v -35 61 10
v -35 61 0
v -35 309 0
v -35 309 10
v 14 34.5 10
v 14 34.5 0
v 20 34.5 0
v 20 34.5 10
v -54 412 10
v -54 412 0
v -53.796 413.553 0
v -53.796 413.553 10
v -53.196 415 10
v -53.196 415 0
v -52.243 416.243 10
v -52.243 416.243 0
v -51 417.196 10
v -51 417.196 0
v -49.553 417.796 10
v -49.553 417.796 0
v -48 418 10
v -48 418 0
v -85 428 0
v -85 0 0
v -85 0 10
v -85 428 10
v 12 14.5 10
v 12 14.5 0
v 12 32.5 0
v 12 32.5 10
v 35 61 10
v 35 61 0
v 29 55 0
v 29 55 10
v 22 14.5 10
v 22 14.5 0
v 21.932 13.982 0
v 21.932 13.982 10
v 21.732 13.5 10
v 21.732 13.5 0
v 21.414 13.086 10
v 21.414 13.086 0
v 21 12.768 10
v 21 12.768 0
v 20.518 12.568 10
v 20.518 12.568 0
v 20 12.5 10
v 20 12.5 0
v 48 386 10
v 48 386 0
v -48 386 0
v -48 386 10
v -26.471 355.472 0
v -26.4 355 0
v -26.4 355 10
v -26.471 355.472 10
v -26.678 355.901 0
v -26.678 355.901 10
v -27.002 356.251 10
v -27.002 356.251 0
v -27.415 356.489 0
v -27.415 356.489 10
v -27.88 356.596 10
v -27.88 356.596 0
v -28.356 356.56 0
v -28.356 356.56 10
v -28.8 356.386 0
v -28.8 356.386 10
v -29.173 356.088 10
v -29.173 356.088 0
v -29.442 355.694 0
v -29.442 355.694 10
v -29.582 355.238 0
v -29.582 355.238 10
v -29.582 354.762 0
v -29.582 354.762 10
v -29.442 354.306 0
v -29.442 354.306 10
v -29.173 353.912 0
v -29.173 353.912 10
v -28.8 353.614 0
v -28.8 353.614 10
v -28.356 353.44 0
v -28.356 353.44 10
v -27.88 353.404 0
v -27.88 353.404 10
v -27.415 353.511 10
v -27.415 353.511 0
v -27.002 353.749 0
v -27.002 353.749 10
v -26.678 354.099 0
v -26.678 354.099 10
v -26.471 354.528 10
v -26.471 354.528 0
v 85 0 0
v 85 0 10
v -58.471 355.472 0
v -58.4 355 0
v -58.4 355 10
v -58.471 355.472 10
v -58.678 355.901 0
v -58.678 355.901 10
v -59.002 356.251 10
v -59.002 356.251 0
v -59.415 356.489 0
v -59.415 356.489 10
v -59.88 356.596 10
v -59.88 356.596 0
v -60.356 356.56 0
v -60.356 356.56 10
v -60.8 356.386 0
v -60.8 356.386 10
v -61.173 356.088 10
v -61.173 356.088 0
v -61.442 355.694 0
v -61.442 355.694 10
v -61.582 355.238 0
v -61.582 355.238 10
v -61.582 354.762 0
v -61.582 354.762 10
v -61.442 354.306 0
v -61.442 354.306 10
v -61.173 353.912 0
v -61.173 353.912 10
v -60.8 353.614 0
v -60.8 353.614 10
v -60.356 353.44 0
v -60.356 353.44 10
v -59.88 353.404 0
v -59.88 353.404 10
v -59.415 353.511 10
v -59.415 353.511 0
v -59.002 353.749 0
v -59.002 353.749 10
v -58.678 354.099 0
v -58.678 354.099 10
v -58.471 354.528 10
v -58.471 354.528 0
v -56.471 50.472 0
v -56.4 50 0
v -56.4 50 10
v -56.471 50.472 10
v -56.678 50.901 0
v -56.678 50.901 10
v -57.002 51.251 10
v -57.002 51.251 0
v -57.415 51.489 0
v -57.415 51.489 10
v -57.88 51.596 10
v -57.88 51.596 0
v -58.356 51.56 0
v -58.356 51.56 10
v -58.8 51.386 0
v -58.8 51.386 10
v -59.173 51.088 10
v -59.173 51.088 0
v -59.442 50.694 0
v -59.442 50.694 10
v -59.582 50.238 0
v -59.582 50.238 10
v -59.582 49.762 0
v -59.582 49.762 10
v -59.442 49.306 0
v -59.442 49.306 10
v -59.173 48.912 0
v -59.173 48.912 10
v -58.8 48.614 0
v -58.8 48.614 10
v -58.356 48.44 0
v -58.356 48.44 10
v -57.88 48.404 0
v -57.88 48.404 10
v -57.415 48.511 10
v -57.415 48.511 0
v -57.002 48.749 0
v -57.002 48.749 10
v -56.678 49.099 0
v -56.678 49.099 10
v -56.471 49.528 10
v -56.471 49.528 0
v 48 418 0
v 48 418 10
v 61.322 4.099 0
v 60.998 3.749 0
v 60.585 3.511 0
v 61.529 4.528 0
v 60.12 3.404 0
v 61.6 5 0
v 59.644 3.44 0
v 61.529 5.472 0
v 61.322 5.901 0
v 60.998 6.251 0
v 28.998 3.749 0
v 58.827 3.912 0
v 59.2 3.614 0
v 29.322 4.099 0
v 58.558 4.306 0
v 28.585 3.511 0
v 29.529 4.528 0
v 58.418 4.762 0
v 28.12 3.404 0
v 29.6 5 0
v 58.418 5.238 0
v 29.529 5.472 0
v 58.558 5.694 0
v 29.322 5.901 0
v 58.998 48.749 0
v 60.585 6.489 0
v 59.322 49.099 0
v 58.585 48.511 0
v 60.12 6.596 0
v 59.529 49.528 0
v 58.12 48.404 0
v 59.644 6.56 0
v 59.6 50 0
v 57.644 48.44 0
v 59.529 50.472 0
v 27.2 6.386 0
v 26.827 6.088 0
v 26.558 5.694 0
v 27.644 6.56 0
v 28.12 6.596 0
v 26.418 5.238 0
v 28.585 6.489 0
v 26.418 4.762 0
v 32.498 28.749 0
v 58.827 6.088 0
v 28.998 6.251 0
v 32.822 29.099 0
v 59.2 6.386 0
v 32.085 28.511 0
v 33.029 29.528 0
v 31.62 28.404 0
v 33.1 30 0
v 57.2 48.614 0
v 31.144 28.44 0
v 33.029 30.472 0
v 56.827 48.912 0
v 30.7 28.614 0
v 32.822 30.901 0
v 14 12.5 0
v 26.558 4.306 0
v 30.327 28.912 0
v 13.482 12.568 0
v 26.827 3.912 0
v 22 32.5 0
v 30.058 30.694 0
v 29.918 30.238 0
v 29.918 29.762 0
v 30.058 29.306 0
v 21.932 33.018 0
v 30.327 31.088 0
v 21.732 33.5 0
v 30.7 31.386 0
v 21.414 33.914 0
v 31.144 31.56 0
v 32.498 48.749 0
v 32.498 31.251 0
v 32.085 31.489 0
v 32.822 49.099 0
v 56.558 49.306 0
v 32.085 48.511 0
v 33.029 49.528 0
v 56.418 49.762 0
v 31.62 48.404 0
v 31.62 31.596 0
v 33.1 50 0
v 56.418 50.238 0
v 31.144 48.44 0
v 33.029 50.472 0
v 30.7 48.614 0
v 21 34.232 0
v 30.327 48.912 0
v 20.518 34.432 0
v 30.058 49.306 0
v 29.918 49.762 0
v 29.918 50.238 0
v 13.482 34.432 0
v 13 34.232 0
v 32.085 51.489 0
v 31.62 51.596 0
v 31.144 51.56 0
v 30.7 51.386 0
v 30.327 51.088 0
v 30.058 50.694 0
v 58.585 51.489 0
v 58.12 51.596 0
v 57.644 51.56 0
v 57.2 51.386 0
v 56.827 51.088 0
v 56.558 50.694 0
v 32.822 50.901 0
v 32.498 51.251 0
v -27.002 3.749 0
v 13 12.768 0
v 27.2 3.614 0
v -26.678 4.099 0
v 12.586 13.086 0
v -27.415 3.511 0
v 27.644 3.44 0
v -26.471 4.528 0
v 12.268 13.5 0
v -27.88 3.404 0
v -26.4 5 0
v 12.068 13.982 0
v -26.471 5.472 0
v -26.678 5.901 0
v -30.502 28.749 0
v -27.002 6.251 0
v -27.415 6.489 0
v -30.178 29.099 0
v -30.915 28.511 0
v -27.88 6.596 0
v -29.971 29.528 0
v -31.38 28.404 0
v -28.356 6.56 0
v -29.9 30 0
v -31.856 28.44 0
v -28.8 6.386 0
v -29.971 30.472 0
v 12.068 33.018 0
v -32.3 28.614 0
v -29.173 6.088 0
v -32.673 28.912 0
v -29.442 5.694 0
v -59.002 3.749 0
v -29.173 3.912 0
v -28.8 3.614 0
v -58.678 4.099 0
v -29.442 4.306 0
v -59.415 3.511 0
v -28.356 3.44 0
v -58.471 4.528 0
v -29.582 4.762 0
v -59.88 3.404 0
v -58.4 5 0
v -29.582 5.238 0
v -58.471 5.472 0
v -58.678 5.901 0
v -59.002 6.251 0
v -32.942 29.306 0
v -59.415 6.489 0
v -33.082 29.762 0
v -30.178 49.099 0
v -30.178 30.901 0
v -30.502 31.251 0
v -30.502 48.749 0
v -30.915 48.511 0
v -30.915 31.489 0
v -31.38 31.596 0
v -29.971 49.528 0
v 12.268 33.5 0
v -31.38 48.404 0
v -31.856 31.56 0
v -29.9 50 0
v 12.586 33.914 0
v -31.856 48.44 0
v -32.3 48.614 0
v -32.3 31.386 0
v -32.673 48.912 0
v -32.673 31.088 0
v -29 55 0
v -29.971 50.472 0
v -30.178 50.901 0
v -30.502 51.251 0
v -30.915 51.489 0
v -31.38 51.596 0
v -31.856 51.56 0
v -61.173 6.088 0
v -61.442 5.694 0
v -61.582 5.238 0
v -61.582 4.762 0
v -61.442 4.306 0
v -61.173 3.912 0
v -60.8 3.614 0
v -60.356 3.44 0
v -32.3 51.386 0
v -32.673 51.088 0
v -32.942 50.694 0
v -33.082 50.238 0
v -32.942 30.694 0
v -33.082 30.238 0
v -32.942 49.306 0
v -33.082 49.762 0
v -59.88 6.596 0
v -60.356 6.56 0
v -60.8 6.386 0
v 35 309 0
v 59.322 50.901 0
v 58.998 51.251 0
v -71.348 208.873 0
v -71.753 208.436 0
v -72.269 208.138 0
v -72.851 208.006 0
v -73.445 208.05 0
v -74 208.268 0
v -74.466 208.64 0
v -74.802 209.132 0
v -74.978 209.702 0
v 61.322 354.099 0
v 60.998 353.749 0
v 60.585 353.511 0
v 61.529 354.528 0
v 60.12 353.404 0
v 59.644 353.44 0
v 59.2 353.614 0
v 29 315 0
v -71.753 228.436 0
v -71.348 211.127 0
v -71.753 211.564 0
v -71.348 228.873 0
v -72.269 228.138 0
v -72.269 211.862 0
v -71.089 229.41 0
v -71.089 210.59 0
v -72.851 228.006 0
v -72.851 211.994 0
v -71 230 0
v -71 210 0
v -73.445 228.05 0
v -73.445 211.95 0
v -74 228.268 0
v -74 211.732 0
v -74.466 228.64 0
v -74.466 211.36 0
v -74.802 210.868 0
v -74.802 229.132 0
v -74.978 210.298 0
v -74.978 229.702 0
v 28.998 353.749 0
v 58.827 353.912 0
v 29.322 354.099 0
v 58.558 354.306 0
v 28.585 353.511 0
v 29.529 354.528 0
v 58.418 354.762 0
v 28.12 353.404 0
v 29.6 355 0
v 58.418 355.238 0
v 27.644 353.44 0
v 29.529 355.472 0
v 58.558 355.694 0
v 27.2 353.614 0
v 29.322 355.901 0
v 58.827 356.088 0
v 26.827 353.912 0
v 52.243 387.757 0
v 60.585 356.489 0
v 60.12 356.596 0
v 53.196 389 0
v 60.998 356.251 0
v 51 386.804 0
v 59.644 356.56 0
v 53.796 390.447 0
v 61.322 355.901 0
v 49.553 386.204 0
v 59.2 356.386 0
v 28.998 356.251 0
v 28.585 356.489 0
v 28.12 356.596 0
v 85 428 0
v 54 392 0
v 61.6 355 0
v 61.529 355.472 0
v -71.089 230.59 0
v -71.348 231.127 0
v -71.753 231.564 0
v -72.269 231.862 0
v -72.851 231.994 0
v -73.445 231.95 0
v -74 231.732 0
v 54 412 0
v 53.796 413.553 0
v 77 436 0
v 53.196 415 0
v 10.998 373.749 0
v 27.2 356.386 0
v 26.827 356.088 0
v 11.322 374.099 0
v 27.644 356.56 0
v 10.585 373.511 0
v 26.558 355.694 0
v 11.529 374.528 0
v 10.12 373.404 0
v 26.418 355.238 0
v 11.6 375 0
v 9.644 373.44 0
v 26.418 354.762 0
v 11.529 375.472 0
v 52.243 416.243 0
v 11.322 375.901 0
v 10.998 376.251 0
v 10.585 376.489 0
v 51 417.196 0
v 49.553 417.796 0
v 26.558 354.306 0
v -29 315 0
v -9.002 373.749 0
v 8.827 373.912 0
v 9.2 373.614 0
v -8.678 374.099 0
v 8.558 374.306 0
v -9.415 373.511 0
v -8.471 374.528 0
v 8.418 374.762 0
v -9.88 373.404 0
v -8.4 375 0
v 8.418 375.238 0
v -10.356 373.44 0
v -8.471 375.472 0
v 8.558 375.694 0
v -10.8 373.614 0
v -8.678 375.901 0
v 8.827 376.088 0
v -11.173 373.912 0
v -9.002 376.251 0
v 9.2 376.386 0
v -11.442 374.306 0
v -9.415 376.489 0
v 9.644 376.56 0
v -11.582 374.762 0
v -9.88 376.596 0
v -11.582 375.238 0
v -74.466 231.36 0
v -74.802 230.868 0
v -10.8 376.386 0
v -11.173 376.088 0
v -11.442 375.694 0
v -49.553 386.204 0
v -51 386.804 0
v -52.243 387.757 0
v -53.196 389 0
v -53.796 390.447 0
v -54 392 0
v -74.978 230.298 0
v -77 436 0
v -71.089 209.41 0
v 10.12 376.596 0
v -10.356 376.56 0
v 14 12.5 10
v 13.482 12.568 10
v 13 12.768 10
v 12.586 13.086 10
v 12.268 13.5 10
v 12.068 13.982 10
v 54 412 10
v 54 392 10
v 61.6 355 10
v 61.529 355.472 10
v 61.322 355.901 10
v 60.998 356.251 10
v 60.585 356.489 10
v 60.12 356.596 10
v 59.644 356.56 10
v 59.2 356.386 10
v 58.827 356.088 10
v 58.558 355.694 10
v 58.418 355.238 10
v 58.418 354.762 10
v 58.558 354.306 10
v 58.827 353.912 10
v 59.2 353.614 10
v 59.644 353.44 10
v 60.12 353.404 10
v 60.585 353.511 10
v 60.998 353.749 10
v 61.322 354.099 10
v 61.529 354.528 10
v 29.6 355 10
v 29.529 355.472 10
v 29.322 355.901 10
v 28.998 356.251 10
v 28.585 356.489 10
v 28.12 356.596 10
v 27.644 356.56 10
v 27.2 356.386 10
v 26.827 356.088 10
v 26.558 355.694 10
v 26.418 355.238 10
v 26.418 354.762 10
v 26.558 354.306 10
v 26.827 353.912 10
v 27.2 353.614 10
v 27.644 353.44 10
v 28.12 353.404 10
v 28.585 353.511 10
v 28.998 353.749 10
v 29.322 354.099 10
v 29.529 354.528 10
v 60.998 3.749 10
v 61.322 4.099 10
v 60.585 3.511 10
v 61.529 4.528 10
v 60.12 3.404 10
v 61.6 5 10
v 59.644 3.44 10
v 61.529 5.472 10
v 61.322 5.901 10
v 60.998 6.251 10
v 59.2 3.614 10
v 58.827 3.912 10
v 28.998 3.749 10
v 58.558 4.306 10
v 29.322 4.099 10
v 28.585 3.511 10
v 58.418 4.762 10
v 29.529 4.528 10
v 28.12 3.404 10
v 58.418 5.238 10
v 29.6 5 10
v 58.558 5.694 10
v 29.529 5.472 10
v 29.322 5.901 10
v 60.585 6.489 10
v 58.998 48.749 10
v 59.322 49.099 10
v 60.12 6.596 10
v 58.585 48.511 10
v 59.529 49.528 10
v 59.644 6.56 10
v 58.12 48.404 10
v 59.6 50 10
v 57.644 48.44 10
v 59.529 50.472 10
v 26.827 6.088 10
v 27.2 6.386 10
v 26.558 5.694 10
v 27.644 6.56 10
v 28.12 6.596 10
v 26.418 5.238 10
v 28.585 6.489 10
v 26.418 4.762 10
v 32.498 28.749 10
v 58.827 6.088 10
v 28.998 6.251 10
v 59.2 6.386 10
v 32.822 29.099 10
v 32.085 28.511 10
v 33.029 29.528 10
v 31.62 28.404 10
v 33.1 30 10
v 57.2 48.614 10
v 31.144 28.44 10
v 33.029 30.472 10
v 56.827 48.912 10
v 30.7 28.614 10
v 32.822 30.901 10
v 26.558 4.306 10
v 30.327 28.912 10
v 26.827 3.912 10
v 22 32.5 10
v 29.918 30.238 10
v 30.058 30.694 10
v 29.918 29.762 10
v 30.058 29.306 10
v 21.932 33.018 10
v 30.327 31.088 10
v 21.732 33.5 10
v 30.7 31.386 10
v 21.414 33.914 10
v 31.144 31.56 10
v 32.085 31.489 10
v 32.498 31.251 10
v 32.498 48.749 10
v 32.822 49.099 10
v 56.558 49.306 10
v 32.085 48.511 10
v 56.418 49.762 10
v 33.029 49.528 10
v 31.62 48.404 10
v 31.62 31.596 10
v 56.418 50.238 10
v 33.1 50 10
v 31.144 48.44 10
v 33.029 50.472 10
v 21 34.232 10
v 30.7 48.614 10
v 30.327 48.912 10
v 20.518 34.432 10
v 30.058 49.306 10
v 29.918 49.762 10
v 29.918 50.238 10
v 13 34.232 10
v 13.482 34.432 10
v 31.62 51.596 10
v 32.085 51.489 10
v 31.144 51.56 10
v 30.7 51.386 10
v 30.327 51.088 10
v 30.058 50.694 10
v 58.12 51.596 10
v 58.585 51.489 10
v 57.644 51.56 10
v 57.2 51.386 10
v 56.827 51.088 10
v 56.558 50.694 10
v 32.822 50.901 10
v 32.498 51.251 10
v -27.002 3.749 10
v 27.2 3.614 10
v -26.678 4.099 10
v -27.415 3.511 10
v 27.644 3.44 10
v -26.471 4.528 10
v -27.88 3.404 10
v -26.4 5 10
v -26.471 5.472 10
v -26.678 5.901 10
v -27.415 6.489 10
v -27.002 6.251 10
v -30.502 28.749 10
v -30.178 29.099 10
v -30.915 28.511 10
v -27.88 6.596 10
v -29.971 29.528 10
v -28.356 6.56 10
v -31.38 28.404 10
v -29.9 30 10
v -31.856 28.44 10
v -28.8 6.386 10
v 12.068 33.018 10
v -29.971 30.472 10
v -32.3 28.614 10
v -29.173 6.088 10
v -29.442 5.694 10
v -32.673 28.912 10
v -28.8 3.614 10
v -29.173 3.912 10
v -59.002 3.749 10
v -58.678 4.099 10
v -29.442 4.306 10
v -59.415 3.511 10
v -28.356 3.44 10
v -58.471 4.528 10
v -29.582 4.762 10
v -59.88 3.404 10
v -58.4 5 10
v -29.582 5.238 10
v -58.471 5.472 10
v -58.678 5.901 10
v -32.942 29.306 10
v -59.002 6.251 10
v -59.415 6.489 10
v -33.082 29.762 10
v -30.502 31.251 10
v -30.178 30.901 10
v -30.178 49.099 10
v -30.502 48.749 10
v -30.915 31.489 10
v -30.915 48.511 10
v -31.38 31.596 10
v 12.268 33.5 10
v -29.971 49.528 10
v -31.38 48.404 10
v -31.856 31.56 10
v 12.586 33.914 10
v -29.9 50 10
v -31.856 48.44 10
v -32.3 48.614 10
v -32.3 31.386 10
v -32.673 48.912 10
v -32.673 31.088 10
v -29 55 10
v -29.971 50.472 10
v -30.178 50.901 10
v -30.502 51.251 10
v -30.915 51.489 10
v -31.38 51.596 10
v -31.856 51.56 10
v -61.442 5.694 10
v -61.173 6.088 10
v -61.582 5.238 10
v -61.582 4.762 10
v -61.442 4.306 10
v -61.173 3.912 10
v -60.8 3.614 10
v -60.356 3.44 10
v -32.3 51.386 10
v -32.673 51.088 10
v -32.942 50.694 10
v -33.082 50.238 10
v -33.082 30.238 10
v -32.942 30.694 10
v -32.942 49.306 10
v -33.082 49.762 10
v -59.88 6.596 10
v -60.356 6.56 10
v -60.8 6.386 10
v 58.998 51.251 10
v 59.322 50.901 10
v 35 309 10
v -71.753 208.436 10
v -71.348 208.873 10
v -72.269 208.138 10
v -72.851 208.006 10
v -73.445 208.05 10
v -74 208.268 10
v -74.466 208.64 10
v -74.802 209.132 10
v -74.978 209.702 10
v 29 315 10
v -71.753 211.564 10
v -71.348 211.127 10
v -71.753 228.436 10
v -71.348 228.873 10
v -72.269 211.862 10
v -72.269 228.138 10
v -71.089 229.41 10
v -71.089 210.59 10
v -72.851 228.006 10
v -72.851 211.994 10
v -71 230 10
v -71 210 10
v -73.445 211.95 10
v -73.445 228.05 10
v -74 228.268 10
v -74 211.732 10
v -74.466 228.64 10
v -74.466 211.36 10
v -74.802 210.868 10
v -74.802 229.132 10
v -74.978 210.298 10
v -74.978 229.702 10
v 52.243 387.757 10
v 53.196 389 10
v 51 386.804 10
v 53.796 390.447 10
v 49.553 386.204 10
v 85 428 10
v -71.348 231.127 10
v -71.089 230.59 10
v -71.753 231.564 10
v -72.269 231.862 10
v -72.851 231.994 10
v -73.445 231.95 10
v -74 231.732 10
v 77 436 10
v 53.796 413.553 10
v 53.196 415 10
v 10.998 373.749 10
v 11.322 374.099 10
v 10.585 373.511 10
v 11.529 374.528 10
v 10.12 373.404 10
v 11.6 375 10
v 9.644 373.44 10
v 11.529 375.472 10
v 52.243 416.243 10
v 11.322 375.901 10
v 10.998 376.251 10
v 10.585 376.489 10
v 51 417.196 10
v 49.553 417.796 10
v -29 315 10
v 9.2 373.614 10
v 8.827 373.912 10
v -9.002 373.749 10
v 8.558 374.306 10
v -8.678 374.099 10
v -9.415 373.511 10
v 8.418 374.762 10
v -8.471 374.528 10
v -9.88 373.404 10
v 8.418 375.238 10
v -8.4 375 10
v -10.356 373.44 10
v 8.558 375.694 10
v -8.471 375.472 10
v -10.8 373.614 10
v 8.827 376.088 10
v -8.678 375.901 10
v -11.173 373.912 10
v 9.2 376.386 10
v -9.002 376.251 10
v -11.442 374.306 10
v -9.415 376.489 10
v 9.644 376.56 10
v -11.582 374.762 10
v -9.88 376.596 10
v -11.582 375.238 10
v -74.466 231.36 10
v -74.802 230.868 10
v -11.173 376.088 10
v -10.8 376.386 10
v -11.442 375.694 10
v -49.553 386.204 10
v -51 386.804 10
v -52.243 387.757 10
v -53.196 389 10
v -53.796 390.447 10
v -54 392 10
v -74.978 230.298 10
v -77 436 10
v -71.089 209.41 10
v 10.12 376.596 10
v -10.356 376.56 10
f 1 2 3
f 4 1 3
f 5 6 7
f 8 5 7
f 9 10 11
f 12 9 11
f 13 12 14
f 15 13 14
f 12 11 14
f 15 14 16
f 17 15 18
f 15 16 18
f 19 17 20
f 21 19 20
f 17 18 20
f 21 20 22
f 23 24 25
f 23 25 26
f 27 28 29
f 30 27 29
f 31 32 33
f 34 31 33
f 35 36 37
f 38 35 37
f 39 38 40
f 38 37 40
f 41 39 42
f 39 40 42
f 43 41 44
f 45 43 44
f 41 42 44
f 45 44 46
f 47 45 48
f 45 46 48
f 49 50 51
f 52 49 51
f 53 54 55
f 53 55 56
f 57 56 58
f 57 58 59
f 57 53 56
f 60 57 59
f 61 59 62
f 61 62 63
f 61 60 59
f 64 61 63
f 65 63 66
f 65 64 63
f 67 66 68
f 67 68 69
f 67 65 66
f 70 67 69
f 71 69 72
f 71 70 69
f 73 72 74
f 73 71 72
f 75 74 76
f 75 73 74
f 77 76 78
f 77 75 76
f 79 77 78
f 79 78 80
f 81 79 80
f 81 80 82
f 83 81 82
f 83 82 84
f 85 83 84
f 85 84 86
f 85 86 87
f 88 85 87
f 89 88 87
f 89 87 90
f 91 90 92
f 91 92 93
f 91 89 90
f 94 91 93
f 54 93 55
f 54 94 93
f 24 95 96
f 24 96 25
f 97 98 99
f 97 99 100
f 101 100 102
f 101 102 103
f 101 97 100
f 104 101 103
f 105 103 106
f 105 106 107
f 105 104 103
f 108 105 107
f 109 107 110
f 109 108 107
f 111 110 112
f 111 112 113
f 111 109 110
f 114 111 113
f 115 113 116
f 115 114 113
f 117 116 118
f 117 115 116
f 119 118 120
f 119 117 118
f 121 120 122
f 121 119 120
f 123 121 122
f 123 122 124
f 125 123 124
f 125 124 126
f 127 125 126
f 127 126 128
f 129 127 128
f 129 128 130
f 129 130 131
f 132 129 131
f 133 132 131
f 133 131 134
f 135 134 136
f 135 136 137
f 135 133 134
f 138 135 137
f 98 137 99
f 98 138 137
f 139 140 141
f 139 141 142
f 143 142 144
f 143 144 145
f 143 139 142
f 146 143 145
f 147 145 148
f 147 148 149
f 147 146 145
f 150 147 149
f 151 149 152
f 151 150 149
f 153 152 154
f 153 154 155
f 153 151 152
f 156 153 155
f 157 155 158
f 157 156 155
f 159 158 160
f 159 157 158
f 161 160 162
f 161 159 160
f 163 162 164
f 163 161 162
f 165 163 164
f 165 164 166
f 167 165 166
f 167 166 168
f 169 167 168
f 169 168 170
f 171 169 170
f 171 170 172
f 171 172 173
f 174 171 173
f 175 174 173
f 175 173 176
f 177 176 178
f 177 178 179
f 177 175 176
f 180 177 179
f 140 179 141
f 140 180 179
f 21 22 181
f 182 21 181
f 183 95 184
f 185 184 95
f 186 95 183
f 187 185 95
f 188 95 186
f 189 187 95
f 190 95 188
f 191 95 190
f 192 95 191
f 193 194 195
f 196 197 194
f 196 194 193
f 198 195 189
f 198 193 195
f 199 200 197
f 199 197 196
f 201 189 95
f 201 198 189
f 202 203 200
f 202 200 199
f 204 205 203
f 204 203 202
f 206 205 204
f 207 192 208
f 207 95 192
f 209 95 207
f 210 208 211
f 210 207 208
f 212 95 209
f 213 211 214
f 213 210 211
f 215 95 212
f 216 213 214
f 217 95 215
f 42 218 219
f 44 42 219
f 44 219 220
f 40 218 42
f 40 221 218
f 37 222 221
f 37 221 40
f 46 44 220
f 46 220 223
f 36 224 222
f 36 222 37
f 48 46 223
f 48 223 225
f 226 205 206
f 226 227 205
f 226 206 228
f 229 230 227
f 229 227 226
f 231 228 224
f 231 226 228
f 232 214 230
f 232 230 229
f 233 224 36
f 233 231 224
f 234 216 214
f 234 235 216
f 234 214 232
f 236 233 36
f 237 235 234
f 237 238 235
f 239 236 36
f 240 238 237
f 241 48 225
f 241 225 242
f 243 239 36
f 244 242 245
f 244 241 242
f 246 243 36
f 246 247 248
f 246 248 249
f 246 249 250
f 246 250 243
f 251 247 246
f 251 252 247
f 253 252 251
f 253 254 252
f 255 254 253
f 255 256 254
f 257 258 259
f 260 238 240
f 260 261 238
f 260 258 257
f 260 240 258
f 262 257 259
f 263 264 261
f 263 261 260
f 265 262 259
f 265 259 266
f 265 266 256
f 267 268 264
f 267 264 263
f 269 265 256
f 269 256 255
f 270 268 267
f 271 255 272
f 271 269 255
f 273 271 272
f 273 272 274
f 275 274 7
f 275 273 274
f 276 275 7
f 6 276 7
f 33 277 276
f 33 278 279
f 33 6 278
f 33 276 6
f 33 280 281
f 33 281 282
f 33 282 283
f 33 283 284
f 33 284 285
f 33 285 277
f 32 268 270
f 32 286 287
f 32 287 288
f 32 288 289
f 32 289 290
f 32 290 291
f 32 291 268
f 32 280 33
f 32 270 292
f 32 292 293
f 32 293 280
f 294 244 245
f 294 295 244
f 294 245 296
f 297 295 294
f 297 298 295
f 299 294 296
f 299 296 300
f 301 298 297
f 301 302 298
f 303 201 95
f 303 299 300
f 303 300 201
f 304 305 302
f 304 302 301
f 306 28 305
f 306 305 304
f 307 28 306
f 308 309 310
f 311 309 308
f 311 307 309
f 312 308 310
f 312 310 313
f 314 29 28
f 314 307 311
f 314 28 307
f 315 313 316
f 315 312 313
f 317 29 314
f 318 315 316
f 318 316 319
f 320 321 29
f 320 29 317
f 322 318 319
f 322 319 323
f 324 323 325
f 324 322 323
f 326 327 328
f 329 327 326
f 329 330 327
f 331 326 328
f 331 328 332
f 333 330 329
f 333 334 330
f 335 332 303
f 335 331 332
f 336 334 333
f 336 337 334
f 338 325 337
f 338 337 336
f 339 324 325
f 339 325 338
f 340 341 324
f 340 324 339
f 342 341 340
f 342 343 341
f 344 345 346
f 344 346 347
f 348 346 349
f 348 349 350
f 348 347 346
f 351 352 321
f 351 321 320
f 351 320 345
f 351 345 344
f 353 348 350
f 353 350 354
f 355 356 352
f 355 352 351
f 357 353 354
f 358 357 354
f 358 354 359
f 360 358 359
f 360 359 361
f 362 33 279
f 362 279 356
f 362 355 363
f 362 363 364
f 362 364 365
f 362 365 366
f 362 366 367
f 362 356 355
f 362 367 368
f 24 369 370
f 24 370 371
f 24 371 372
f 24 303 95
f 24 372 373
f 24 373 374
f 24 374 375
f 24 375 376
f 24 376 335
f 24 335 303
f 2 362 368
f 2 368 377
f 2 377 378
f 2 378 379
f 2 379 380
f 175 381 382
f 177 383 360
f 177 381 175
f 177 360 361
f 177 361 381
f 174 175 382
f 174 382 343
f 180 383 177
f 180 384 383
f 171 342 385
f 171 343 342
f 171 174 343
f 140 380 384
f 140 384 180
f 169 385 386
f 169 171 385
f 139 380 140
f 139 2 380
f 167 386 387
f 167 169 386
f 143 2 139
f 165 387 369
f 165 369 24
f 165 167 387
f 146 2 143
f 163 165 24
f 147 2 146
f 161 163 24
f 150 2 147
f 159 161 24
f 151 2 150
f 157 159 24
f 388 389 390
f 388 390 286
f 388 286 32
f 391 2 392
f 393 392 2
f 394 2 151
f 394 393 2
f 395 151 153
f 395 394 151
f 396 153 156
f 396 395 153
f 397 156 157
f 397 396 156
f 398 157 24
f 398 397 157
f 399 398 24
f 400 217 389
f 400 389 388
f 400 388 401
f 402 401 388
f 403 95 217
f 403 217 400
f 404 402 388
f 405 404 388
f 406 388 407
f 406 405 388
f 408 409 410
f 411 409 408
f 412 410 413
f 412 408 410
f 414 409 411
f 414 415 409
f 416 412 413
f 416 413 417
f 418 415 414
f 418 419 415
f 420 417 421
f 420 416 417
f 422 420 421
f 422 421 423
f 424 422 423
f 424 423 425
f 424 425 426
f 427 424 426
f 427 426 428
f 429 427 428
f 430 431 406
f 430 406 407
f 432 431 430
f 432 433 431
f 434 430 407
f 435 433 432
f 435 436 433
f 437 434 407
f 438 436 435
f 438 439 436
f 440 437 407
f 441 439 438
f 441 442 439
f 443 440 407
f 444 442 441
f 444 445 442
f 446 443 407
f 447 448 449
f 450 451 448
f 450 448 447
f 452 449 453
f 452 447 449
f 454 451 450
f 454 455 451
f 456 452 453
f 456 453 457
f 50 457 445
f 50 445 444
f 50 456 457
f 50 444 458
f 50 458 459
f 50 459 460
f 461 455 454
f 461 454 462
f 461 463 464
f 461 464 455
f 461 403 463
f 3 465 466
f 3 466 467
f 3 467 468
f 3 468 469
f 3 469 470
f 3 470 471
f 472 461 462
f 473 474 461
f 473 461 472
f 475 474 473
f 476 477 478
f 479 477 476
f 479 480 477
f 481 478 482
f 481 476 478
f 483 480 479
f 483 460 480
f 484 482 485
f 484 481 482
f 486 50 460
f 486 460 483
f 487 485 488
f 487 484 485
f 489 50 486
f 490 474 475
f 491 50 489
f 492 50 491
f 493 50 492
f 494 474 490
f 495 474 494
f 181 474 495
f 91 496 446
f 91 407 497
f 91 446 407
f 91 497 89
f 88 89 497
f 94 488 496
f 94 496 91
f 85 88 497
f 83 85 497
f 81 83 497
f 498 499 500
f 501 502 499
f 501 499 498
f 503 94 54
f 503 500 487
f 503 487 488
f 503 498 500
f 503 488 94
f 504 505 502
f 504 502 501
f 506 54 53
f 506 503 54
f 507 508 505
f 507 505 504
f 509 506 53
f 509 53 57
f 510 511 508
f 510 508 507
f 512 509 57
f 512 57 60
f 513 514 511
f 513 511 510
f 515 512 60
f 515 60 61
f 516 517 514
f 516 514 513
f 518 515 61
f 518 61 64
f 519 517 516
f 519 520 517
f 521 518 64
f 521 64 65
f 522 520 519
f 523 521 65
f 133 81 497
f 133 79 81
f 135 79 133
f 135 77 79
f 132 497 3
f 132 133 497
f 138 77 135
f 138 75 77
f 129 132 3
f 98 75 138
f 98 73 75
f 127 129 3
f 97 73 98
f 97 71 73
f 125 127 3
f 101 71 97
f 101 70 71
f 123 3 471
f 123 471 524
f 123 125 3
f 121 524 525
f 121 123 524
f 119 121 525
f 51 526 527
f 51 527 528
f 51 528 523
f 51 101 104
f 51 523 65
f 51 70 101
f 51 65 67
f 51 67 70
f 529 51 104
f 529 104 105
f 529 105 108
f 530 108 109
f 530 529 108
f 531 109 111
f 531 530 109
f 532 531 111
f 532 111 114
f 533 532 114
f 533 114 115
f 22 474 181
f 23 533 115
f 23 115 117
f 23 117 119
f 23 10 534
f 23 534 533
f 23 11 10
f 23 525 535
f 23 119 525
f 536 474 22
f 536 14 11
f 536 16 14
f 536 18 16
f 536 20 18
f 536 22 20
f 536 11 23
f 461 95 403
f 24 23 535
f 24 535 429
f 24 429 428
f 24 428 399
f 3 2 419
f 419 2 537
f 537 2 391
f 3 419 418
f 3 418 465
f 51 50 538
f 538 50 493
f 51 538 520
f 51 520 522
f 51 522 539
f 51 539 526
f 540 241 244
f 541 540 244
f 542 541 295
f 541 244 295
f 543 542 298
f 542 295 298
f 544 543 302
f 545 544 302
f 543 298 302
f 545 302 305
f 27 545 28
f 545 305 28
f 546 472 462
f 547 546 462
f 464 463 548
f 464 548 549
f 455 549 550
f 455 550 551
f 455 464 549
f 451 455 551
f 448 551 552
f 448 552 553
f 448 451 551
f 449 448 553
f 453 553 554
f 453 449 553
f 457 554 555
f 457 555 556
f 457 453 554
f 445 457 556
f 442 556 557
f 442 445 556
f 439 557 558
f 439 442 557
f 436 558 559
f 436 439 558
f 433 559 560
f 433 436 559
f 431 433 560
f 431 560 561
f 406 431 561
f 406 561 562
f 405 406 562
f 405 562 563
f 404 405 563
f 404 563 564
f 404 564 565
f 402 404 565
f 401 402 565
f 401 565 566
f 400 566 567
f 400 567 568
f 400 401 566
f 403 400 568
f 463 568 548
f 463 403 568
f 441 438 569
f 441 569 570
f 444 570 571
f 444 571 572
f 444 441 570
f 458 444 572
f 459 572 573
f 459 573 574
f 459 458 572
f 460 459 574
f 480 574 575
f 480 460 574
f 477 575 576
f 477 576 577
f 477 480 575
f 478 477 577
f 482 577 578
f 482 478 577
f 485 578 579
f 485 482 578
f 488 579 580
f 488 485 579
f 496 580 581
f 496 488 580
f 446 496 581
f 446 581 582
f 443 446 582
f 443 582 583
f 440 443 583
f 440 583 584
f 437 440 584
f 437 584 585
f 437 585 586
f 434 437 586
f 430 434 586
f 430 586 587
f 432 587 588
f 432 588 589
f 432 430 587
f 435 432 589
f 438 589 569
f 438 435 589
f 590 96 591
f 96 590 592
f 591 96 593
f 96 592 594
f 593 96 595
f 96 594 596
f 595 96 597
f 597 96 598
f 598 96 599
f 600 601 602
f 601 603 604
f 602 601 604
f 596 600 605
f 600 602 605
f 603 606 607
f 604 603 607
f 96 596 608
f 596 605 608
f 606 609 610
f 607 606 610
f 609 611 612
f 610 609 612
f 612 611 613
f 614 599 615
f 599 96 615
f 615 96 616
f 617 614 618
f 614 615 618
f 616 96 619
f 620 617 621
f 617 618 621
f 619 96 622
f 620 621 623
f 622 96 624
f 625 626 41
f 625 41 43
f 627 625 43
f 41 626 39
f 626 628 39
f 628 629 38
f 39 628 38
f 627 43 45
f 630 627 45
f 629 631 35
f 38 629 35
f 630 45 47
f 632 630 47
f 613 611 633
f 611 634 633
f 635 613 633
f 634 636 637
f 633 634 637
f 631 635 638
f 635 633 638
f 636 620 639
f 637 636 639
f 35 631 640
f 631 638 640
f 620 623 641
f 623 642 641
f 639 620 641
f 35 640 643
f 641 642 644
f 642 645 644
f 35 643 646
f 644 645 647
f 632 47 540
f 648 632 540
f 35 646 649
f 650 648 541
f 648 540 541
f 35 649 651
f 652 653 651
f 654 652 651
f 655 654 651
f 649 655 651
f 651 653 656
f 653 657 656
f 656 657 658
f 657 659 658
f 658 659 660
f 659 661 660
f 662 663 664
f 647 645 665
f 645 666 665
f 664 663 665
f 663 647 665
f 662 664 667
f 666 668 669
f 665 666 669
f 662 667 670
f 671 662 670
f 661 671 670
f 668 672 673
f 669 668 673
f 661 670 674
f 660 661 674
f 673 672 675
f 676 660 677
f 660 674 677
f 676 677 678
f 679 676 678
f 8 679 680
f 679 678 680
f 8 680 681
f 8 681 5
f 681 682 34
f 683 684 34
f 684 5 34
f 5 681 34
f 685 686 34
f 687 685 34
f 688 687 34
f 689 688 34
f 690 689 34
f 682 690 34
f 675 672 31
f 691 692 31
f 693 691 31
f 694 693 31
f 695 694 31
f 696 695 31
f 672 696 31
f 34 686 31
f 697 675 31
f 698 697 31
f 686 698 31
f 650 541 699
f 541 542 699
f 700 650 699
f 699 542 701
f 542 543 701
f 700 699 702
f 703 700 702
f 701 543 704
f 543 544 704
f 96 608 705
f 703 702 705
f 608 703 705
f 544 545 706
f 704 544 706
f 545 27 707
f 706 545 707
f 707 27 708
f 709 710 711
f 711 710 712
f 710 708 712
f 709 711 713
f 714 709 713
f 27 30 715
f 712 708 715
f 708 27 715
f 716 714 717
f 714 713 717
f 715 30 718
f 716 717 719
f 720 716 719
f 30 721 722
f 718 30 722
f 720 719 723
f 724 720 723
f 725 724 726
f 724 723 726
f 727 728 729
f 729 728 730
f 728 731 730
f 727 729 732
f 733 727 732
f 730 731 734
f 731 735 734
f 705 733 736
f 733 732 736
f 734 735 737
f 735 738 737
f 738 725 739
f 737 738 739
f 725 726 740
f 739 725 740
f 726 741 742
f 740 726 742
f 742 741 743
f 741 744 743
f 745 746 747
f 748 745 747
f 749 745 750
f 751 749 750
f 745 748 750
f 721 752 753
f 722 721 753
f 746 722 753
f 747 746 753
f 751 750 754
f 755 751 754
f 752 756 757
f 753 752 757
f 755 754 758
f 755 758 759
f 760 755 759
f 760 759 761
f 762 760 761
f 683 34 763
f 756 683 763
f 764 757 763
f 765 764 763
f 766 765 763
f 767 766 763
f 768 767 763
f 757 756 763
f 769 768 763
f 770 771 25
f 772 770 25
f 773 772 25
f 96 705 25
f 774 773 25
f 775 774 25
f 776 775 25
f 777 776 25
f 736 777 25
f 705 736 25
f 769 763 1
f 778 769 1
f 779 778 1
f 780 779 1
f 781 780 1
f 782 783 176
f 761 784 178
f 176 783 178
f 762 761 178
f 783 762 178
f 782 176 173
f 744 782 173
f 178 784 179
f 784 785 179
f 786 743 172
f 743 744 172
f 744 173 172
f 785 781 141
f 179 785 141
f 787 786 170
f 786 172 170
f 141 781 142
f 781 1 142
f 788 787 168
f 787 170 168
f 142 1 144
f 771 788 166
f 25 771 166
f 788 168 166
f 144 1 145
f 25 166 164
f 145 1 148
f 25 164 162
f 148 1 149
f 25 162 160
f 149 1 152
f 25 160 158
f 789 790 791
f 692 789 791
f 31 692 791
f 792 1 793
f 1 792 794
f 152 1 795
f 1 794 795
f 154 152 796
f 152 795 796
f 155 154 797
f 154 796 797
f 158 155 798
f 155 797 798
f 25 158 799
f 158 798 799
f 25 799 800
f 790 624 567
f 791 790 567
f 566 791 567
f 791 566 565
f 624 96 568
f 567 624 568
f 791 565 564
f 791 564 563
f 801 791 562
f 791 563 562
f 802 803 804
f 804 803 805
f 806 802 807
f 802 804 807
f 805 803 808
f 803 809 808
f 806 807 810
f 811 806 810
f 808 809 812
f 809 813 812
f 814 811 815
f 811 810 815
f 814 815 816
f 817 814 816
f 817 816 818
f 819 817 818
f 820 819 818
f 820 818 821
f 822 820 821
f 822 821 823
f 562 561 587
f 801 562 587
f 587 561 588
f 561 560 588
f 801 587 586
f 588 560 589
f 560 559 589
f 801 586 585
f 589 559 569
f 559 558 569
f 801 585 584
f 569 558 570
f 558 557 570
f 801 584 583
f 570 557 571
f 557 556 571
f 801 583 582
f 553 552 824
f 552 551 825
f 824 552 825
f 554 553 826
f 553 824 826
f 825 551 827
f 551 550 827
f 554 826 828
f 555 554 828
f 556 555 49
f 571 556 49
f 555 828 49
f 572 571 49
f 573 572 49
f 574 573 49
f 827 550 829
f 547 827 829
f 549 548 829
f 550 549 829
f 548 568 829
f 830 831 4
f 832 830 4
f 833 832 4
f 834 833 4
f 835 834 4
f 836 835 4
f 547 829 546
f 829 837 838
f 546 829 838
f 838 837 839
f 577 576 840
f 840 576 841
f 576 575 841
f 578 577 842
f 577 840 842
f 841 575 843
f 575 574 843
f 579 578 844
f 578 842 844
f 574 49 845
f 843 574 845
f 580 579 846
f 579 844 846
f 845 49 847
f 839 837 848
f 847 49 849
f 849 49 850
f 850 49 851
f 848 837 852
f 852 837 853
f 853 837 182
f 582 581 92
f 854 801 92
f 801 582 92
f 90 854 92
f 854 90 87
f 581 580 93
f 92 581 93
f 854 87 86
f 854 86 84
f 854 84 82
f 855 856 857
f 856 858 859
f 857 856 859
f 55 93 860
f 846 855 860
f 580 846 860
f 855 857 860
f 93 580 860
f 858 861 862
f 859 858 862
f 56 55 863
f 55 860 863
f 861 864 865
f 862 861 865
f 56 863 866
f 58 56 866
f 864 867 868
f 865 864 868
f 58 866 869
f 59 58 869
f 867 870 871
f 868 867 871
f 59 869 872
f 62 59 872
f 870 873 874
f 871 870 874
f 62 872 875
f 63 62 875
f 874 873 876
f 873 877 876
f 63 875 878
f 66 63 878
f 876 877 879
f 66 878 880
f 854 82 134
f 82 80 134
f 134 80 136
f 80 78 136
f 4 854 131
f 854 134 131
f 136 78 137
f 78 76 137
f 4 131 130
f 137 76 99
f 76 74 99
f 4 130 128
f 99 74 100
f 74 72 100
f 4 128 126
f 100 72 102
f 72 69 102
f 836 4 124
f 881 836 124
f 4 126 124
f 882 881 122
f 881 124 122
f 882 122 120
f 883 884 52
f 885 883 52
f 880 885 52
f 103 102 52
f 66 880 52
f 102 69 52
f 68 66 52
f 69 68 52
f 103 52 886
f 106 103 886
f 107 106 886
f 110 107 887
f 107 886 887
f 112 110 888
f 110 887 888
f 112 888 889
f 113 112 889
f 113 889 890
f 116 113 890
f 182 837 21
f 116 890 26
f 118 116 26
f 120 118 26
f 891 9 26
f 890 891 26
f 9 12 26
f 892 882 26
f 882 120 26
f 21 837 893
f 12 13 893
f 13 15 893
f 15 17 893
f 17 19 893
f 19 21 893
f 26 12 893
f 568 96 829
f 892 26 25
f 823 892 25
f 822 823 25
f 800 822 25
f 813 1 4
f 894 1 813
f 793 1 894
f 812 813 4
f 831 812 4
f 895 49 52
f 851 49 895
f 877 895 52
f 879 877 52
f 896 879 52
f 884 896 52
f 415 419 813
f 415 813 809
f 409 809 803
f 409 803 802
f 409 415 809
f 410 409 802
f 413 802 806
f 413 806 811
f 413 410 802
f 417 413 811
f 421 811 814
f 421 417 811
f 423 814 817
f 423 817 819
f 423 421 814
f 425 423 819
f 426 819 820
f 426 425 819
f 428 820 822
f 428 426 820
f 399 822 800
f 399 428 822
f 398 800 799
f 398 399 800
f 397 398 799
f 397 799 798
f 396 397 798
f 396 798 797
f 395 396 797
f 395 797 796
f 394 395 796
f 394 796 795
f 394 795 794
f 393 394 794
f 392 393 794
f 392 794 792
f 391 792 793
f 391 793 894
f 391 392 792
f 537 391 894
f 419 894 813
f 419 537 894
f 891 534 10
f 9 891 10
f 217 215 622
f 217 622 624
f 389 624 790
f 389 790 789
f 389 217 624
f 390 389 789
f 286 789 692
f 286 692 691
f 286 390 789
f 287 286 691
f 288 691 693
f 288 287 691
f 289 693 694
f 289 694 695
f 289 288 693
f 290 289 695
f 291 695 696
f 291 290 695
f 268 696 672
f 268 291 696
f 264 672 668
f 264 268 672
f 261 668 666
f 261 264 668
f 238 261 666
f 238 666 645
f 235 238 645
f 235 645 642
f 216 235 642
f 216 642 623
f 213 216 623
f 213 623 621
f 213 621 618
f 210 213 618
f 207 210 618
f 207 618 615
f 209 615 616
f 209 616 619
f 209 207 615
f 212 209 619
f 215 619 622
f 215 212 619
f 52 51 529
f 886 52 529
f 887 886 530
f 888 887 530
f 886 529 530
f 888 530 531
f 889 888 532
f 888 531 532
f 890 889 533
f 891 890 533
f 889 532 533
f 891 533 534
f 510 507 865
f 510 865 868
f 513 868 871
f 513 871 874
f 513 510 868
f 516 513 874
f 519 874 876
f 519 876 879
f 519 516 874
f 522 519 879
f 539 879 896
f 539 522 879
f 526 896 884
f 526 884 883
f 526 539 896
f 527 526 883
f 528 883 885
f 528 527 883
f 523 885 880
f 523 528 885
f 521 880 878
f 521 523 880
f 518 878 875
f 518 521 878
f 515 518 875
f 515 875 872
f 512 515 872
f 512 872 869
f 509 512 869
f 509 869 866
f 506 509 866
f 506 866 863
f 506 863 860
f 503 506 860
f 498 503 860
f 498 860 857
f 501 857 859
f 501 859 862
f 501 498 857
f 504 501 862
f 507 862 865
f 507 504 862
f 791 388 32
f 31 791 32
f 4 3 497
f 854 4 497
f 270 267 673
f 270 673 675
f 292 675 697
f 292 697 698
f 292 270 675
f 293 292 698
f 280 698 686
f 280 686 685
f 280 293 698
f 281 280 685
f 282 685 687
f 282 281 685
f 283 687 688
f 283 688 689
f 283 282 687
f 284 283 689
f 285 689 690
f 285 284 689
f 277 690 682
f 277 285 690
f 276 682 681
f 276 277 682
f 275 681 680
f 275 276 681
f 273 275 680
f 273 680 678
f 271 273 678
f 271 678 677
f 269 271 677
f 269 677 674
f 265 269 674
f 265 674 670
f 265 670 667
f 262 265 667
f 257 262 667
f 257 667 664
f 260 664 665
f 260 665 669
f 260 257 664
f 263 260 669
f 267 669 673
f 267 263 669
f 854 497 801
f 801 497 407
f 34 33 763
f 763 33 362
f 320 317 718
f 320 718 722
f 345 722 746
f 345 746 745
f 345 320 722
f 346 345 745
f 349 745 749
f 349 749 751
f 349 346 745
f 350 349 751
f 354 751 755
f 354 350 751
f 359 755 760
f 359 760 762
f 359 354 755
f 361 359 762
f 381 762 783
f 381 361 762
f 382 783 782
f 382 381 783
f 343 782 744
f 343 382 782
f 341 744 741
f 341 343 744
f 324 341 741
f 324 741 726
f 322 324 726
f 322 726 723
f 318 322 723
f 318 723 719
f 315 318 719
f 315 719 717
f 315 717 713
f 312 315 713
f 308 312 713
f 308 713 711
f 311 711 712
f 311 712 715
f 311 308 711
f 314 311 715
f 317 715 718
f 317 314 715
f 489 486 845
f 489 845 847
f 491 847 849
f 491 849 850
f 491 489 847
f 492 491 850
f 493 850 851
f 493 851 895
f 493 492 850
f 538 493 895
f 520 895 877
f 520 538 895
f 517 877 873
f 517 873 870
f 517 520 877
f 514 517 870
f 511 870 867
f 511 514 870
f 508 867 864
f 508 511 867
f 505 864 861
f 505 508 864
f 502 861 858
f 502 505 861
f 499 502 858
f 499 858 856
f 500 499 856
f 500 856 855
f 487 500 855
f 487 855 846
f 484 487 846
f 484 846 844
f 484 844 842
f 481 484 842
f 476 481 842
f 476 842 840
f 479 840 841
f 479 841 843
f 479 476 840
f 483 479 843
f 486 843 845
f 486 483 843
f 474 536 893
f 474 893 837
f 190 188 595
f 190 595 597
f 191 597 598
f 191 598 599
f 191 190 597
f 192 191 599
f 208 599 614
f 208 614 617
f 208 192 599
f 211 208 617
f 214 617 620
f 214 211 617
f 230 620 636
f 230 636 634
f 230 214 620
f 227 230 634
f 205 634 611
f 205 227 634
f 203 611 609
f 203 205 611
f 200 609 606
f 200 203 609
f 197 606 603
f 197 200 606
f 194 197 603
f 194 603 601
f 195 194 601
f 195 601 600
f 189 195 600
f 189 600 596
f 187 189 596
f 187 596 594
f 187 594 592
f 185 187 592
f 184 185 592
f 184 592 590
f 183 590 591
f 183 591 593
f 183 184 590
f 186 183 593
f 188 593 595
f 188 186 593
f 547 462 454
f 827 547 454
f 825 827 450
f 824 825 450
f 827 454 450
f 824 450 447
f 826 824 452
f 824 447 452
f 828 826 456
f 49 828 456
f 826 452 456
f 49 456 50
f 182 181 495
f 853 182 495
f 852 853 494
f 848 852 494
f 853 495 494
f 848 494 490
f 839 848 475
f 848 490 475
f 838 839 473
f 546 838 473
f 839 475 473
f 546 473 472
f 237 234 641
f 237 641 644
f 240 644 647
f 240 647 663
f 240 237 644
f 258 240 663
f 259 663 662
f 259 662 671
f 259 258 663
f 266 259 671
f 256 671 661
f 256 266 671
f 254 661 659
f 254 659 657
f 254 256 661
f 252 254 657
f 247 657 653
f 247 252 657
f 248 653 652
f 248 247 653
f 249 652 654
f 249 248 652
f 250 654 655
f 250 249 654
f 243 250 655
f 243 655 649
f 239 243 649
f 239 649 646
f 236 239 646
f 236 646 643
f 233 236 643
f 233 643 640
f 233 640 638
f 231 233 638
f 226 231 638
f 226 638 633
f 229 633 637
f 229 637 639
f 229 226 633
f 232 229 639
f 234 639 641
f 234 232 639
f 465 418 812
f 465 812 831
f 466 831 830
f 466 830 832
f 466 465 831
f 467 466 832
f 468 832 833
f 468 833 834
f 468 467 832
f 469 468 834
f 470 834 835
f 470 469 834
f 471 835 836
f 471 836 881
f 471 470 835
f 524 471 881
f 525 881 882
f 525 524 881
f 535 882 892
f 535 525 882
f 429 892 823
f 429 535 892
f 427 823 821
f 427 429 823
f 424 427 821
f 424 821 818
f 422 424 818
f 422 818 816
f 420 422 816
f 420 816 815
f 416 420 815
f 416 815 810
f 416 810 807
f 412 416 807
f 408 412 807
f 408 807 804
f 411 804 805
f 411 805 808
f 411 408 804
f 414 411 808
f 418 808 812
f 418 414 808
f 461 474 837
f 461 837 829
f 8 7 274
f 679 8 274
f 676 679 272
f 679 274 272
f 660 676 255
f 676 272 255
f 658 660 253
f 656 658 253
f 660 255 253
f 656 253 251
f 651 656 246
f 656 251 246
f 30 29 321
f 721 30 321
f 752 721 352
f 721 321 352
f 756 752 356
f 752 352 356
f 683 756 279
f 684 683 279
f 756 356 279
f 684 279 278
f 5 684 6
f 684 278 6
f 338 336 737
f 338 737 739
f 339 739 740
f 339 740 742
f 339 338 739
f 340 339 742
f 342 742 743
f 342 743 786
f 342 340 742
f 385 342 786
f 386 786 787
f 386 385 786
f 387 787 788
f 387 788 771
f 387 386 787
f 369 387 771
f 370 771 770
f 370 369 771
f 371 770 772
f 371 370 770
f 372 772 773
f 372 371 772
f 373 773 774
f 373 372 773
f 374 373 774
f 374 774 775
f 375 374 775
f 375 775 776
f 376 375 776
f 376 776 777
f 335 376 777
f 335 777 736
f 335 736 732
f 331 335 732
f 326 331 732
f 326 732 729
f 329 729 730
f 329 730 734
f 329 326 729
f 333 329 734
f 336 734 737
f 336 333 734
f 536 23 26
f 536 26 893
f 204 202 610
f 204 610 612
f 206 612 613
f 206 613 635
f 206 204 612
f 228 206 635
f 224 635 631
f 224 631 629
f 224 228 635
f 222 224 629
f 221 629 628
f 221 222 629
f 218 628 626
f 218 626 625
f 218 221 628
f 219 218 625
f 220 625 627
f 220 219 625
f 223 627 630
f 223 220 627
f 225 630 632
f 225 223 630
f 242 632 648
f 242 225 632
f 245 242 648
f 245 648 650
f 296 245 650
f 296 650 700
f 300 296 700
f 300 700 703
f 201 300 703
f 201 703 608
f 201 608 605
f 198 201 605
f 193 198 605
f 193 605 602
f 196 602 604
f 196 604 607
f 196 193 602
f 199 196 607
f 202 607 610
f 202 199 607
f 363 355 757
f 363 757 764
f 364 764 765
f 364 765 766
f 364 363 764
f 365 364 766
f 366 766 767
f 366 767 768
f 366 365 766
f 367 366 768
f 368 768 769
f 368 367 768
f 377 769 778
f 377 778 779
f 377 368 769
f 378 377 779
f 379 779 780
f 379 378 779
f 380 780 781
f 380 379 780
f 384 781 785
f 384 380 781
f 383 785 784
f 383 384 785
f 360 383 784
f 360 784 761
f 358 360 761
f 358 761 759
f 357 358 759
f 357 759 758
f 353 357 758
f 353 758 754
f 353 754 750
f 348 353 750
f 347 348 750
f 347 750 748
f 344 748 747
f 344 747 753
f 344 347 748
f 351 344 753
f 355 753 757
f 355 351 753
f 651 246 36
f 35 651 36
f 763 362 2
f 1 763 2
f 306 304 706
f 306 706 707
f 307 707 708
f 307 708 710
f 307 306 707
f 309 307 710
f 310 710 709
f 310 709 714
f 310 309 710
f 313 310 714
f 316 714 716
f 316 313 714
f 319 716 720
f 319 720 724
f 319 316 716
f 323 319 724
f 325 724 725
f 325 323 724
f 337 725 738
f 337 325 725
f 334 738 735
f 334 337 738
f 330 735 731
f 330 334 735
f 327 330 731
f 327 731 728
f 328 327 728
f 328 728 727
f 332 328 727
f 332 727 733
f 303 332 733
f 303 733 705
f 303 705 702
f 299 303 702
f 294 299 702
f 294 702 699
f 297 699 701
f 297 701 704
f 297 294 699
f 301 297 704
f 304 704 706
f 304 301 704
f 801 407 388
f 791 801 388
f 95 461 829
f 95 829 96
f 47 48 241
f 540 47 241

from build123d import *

# Parameters (mm, degrees)
MODEL_R             = 1.6
MODEL_R_2           = 2
BOSS_EXTRUDE1_DEPTH = 10


with BuildPart() as part:
    # Model → Boss-Extrude1 (new body)
    with BuildSketch(Plane.XY):
        Polygon((85, 428), (85, 0), (-85, 0), (-85, 428), (-77, 436), (77, 436), align=None)
        with Locations((-31.5, 50)):
            Circle(MODEL_R, mode=Mode.SUBTRACT)
        with Locations((-31.5, 30)):
            Circle(MODEL_R, mode=Mode.SUBTRACT)
        with Locations((31.5, 30)):
            Circle(MODEL_R, mode=Mode.SUBTRACT)
        with Locations((31.5, 50)):
            Circle(MODEL_R, mode=Mode.SUBTRACT)
        with Locations((-58, 50)):
            Circle(MODEL_R, mode=Mode.SUBTRACT)
        with Locations((-73, 210)):
            Circle(MODEL_R_2, mode=Mode.SUBTRACT)
        with Locations((-73, 230)):
            Circle(MODEL_R_2, mode=Mode.SUBTRACT)
        with Locations((60, 355)):
            Circle(MODEL_R, mode=Mode.SUBTRACT)
        with Locations((58, 50)):
            Circle(MODEL_R, mode=Mode.SUBTRACT)
        with Locations((-60, 355)):
            Circle(MODEL_R, mode=Mode.SUBTRACT)
        with Locations((-28, 355)):
            Circle(MODEL_R, mode=Mode.SUBTRACT)
        with Locations((28, 355)):
            Circle(MODEL_R, mode=Mode.SUBTRACT)
        with Locations((60, 5)):
            Circle(MODEL_R, mode=Mode.SUBTRACT)
        with Locations((28, 5)):
            Circle(MODEL_R, mode=Mode.SUBTRACT)
        with Locations((-28, 5)):
            Circle(MODEL_R, mode=Mode.SUBTRACT)
        with Locations((-60, 5)):
            Circle(MODEL_R, mode=Mode.SUBTRACT)
        with Locations((10, 375)):
            Circle(MODEL_R, mode=Mode.SUBTRACT)
        with Locations((-10, 375)):
            Circle(MODEL_R, mode=Mode.SUBTRACT)
        with BuildLine():
            Line((14, 34.5), (20, 34.5))
            ThreePointArc((20, 34.5), (21.414213562, 33.914213562), (22, 32.5))
            Line((22, 32.5), (22, 14.5))
            ThreePointArc((22, 14.5), (21.414213562, 13.085786438), (20, 12.5))
            Line((20, 12.5), (14, 12.5))
            ThreePointArc((14, 12.5), (12.585786438, 13.085786438), (12, 14.5))
            Line((12, 14.5), (12, 32.5))
            ThreePointArc((12, 32.5), (12.585786438, 33.914213562), (14, 34.5))
        make_face(mode=Mode.SUBTRACT)
        Polygon((-29, 315), (29, 315), (35, 309), (35, 61), (29, 55), (-29, 55), (-35, 61), (-35, 309), align=None, mode=Mode.SUBTRACT)
        with BuildLine():
            Line((-54, 392), (-54, 412))
            ThreePointArc((-54, 412), (-52.242640687, 416.242640687), (-48, 418))
            Line((-48, 418), (48, 418))
            ThreePointArc((48, 418), (52.242640687, 416.242640687), (54, 412))
            Line((54, 412), (54, 392))
            ThreePointArc((54, 392), (52.242640687, 387.757359313), (48, 386))
            Line((48, 386), (-48, 386))
            ThreePointArc((-48, 386), (-52.242640687, 387.757359313), (-54, 392))
        make_face(mode=Mode.SUBTRACT)
    extrude(amount=BOSS_EXTRUDE1_DEPTH)


solid = part.part
